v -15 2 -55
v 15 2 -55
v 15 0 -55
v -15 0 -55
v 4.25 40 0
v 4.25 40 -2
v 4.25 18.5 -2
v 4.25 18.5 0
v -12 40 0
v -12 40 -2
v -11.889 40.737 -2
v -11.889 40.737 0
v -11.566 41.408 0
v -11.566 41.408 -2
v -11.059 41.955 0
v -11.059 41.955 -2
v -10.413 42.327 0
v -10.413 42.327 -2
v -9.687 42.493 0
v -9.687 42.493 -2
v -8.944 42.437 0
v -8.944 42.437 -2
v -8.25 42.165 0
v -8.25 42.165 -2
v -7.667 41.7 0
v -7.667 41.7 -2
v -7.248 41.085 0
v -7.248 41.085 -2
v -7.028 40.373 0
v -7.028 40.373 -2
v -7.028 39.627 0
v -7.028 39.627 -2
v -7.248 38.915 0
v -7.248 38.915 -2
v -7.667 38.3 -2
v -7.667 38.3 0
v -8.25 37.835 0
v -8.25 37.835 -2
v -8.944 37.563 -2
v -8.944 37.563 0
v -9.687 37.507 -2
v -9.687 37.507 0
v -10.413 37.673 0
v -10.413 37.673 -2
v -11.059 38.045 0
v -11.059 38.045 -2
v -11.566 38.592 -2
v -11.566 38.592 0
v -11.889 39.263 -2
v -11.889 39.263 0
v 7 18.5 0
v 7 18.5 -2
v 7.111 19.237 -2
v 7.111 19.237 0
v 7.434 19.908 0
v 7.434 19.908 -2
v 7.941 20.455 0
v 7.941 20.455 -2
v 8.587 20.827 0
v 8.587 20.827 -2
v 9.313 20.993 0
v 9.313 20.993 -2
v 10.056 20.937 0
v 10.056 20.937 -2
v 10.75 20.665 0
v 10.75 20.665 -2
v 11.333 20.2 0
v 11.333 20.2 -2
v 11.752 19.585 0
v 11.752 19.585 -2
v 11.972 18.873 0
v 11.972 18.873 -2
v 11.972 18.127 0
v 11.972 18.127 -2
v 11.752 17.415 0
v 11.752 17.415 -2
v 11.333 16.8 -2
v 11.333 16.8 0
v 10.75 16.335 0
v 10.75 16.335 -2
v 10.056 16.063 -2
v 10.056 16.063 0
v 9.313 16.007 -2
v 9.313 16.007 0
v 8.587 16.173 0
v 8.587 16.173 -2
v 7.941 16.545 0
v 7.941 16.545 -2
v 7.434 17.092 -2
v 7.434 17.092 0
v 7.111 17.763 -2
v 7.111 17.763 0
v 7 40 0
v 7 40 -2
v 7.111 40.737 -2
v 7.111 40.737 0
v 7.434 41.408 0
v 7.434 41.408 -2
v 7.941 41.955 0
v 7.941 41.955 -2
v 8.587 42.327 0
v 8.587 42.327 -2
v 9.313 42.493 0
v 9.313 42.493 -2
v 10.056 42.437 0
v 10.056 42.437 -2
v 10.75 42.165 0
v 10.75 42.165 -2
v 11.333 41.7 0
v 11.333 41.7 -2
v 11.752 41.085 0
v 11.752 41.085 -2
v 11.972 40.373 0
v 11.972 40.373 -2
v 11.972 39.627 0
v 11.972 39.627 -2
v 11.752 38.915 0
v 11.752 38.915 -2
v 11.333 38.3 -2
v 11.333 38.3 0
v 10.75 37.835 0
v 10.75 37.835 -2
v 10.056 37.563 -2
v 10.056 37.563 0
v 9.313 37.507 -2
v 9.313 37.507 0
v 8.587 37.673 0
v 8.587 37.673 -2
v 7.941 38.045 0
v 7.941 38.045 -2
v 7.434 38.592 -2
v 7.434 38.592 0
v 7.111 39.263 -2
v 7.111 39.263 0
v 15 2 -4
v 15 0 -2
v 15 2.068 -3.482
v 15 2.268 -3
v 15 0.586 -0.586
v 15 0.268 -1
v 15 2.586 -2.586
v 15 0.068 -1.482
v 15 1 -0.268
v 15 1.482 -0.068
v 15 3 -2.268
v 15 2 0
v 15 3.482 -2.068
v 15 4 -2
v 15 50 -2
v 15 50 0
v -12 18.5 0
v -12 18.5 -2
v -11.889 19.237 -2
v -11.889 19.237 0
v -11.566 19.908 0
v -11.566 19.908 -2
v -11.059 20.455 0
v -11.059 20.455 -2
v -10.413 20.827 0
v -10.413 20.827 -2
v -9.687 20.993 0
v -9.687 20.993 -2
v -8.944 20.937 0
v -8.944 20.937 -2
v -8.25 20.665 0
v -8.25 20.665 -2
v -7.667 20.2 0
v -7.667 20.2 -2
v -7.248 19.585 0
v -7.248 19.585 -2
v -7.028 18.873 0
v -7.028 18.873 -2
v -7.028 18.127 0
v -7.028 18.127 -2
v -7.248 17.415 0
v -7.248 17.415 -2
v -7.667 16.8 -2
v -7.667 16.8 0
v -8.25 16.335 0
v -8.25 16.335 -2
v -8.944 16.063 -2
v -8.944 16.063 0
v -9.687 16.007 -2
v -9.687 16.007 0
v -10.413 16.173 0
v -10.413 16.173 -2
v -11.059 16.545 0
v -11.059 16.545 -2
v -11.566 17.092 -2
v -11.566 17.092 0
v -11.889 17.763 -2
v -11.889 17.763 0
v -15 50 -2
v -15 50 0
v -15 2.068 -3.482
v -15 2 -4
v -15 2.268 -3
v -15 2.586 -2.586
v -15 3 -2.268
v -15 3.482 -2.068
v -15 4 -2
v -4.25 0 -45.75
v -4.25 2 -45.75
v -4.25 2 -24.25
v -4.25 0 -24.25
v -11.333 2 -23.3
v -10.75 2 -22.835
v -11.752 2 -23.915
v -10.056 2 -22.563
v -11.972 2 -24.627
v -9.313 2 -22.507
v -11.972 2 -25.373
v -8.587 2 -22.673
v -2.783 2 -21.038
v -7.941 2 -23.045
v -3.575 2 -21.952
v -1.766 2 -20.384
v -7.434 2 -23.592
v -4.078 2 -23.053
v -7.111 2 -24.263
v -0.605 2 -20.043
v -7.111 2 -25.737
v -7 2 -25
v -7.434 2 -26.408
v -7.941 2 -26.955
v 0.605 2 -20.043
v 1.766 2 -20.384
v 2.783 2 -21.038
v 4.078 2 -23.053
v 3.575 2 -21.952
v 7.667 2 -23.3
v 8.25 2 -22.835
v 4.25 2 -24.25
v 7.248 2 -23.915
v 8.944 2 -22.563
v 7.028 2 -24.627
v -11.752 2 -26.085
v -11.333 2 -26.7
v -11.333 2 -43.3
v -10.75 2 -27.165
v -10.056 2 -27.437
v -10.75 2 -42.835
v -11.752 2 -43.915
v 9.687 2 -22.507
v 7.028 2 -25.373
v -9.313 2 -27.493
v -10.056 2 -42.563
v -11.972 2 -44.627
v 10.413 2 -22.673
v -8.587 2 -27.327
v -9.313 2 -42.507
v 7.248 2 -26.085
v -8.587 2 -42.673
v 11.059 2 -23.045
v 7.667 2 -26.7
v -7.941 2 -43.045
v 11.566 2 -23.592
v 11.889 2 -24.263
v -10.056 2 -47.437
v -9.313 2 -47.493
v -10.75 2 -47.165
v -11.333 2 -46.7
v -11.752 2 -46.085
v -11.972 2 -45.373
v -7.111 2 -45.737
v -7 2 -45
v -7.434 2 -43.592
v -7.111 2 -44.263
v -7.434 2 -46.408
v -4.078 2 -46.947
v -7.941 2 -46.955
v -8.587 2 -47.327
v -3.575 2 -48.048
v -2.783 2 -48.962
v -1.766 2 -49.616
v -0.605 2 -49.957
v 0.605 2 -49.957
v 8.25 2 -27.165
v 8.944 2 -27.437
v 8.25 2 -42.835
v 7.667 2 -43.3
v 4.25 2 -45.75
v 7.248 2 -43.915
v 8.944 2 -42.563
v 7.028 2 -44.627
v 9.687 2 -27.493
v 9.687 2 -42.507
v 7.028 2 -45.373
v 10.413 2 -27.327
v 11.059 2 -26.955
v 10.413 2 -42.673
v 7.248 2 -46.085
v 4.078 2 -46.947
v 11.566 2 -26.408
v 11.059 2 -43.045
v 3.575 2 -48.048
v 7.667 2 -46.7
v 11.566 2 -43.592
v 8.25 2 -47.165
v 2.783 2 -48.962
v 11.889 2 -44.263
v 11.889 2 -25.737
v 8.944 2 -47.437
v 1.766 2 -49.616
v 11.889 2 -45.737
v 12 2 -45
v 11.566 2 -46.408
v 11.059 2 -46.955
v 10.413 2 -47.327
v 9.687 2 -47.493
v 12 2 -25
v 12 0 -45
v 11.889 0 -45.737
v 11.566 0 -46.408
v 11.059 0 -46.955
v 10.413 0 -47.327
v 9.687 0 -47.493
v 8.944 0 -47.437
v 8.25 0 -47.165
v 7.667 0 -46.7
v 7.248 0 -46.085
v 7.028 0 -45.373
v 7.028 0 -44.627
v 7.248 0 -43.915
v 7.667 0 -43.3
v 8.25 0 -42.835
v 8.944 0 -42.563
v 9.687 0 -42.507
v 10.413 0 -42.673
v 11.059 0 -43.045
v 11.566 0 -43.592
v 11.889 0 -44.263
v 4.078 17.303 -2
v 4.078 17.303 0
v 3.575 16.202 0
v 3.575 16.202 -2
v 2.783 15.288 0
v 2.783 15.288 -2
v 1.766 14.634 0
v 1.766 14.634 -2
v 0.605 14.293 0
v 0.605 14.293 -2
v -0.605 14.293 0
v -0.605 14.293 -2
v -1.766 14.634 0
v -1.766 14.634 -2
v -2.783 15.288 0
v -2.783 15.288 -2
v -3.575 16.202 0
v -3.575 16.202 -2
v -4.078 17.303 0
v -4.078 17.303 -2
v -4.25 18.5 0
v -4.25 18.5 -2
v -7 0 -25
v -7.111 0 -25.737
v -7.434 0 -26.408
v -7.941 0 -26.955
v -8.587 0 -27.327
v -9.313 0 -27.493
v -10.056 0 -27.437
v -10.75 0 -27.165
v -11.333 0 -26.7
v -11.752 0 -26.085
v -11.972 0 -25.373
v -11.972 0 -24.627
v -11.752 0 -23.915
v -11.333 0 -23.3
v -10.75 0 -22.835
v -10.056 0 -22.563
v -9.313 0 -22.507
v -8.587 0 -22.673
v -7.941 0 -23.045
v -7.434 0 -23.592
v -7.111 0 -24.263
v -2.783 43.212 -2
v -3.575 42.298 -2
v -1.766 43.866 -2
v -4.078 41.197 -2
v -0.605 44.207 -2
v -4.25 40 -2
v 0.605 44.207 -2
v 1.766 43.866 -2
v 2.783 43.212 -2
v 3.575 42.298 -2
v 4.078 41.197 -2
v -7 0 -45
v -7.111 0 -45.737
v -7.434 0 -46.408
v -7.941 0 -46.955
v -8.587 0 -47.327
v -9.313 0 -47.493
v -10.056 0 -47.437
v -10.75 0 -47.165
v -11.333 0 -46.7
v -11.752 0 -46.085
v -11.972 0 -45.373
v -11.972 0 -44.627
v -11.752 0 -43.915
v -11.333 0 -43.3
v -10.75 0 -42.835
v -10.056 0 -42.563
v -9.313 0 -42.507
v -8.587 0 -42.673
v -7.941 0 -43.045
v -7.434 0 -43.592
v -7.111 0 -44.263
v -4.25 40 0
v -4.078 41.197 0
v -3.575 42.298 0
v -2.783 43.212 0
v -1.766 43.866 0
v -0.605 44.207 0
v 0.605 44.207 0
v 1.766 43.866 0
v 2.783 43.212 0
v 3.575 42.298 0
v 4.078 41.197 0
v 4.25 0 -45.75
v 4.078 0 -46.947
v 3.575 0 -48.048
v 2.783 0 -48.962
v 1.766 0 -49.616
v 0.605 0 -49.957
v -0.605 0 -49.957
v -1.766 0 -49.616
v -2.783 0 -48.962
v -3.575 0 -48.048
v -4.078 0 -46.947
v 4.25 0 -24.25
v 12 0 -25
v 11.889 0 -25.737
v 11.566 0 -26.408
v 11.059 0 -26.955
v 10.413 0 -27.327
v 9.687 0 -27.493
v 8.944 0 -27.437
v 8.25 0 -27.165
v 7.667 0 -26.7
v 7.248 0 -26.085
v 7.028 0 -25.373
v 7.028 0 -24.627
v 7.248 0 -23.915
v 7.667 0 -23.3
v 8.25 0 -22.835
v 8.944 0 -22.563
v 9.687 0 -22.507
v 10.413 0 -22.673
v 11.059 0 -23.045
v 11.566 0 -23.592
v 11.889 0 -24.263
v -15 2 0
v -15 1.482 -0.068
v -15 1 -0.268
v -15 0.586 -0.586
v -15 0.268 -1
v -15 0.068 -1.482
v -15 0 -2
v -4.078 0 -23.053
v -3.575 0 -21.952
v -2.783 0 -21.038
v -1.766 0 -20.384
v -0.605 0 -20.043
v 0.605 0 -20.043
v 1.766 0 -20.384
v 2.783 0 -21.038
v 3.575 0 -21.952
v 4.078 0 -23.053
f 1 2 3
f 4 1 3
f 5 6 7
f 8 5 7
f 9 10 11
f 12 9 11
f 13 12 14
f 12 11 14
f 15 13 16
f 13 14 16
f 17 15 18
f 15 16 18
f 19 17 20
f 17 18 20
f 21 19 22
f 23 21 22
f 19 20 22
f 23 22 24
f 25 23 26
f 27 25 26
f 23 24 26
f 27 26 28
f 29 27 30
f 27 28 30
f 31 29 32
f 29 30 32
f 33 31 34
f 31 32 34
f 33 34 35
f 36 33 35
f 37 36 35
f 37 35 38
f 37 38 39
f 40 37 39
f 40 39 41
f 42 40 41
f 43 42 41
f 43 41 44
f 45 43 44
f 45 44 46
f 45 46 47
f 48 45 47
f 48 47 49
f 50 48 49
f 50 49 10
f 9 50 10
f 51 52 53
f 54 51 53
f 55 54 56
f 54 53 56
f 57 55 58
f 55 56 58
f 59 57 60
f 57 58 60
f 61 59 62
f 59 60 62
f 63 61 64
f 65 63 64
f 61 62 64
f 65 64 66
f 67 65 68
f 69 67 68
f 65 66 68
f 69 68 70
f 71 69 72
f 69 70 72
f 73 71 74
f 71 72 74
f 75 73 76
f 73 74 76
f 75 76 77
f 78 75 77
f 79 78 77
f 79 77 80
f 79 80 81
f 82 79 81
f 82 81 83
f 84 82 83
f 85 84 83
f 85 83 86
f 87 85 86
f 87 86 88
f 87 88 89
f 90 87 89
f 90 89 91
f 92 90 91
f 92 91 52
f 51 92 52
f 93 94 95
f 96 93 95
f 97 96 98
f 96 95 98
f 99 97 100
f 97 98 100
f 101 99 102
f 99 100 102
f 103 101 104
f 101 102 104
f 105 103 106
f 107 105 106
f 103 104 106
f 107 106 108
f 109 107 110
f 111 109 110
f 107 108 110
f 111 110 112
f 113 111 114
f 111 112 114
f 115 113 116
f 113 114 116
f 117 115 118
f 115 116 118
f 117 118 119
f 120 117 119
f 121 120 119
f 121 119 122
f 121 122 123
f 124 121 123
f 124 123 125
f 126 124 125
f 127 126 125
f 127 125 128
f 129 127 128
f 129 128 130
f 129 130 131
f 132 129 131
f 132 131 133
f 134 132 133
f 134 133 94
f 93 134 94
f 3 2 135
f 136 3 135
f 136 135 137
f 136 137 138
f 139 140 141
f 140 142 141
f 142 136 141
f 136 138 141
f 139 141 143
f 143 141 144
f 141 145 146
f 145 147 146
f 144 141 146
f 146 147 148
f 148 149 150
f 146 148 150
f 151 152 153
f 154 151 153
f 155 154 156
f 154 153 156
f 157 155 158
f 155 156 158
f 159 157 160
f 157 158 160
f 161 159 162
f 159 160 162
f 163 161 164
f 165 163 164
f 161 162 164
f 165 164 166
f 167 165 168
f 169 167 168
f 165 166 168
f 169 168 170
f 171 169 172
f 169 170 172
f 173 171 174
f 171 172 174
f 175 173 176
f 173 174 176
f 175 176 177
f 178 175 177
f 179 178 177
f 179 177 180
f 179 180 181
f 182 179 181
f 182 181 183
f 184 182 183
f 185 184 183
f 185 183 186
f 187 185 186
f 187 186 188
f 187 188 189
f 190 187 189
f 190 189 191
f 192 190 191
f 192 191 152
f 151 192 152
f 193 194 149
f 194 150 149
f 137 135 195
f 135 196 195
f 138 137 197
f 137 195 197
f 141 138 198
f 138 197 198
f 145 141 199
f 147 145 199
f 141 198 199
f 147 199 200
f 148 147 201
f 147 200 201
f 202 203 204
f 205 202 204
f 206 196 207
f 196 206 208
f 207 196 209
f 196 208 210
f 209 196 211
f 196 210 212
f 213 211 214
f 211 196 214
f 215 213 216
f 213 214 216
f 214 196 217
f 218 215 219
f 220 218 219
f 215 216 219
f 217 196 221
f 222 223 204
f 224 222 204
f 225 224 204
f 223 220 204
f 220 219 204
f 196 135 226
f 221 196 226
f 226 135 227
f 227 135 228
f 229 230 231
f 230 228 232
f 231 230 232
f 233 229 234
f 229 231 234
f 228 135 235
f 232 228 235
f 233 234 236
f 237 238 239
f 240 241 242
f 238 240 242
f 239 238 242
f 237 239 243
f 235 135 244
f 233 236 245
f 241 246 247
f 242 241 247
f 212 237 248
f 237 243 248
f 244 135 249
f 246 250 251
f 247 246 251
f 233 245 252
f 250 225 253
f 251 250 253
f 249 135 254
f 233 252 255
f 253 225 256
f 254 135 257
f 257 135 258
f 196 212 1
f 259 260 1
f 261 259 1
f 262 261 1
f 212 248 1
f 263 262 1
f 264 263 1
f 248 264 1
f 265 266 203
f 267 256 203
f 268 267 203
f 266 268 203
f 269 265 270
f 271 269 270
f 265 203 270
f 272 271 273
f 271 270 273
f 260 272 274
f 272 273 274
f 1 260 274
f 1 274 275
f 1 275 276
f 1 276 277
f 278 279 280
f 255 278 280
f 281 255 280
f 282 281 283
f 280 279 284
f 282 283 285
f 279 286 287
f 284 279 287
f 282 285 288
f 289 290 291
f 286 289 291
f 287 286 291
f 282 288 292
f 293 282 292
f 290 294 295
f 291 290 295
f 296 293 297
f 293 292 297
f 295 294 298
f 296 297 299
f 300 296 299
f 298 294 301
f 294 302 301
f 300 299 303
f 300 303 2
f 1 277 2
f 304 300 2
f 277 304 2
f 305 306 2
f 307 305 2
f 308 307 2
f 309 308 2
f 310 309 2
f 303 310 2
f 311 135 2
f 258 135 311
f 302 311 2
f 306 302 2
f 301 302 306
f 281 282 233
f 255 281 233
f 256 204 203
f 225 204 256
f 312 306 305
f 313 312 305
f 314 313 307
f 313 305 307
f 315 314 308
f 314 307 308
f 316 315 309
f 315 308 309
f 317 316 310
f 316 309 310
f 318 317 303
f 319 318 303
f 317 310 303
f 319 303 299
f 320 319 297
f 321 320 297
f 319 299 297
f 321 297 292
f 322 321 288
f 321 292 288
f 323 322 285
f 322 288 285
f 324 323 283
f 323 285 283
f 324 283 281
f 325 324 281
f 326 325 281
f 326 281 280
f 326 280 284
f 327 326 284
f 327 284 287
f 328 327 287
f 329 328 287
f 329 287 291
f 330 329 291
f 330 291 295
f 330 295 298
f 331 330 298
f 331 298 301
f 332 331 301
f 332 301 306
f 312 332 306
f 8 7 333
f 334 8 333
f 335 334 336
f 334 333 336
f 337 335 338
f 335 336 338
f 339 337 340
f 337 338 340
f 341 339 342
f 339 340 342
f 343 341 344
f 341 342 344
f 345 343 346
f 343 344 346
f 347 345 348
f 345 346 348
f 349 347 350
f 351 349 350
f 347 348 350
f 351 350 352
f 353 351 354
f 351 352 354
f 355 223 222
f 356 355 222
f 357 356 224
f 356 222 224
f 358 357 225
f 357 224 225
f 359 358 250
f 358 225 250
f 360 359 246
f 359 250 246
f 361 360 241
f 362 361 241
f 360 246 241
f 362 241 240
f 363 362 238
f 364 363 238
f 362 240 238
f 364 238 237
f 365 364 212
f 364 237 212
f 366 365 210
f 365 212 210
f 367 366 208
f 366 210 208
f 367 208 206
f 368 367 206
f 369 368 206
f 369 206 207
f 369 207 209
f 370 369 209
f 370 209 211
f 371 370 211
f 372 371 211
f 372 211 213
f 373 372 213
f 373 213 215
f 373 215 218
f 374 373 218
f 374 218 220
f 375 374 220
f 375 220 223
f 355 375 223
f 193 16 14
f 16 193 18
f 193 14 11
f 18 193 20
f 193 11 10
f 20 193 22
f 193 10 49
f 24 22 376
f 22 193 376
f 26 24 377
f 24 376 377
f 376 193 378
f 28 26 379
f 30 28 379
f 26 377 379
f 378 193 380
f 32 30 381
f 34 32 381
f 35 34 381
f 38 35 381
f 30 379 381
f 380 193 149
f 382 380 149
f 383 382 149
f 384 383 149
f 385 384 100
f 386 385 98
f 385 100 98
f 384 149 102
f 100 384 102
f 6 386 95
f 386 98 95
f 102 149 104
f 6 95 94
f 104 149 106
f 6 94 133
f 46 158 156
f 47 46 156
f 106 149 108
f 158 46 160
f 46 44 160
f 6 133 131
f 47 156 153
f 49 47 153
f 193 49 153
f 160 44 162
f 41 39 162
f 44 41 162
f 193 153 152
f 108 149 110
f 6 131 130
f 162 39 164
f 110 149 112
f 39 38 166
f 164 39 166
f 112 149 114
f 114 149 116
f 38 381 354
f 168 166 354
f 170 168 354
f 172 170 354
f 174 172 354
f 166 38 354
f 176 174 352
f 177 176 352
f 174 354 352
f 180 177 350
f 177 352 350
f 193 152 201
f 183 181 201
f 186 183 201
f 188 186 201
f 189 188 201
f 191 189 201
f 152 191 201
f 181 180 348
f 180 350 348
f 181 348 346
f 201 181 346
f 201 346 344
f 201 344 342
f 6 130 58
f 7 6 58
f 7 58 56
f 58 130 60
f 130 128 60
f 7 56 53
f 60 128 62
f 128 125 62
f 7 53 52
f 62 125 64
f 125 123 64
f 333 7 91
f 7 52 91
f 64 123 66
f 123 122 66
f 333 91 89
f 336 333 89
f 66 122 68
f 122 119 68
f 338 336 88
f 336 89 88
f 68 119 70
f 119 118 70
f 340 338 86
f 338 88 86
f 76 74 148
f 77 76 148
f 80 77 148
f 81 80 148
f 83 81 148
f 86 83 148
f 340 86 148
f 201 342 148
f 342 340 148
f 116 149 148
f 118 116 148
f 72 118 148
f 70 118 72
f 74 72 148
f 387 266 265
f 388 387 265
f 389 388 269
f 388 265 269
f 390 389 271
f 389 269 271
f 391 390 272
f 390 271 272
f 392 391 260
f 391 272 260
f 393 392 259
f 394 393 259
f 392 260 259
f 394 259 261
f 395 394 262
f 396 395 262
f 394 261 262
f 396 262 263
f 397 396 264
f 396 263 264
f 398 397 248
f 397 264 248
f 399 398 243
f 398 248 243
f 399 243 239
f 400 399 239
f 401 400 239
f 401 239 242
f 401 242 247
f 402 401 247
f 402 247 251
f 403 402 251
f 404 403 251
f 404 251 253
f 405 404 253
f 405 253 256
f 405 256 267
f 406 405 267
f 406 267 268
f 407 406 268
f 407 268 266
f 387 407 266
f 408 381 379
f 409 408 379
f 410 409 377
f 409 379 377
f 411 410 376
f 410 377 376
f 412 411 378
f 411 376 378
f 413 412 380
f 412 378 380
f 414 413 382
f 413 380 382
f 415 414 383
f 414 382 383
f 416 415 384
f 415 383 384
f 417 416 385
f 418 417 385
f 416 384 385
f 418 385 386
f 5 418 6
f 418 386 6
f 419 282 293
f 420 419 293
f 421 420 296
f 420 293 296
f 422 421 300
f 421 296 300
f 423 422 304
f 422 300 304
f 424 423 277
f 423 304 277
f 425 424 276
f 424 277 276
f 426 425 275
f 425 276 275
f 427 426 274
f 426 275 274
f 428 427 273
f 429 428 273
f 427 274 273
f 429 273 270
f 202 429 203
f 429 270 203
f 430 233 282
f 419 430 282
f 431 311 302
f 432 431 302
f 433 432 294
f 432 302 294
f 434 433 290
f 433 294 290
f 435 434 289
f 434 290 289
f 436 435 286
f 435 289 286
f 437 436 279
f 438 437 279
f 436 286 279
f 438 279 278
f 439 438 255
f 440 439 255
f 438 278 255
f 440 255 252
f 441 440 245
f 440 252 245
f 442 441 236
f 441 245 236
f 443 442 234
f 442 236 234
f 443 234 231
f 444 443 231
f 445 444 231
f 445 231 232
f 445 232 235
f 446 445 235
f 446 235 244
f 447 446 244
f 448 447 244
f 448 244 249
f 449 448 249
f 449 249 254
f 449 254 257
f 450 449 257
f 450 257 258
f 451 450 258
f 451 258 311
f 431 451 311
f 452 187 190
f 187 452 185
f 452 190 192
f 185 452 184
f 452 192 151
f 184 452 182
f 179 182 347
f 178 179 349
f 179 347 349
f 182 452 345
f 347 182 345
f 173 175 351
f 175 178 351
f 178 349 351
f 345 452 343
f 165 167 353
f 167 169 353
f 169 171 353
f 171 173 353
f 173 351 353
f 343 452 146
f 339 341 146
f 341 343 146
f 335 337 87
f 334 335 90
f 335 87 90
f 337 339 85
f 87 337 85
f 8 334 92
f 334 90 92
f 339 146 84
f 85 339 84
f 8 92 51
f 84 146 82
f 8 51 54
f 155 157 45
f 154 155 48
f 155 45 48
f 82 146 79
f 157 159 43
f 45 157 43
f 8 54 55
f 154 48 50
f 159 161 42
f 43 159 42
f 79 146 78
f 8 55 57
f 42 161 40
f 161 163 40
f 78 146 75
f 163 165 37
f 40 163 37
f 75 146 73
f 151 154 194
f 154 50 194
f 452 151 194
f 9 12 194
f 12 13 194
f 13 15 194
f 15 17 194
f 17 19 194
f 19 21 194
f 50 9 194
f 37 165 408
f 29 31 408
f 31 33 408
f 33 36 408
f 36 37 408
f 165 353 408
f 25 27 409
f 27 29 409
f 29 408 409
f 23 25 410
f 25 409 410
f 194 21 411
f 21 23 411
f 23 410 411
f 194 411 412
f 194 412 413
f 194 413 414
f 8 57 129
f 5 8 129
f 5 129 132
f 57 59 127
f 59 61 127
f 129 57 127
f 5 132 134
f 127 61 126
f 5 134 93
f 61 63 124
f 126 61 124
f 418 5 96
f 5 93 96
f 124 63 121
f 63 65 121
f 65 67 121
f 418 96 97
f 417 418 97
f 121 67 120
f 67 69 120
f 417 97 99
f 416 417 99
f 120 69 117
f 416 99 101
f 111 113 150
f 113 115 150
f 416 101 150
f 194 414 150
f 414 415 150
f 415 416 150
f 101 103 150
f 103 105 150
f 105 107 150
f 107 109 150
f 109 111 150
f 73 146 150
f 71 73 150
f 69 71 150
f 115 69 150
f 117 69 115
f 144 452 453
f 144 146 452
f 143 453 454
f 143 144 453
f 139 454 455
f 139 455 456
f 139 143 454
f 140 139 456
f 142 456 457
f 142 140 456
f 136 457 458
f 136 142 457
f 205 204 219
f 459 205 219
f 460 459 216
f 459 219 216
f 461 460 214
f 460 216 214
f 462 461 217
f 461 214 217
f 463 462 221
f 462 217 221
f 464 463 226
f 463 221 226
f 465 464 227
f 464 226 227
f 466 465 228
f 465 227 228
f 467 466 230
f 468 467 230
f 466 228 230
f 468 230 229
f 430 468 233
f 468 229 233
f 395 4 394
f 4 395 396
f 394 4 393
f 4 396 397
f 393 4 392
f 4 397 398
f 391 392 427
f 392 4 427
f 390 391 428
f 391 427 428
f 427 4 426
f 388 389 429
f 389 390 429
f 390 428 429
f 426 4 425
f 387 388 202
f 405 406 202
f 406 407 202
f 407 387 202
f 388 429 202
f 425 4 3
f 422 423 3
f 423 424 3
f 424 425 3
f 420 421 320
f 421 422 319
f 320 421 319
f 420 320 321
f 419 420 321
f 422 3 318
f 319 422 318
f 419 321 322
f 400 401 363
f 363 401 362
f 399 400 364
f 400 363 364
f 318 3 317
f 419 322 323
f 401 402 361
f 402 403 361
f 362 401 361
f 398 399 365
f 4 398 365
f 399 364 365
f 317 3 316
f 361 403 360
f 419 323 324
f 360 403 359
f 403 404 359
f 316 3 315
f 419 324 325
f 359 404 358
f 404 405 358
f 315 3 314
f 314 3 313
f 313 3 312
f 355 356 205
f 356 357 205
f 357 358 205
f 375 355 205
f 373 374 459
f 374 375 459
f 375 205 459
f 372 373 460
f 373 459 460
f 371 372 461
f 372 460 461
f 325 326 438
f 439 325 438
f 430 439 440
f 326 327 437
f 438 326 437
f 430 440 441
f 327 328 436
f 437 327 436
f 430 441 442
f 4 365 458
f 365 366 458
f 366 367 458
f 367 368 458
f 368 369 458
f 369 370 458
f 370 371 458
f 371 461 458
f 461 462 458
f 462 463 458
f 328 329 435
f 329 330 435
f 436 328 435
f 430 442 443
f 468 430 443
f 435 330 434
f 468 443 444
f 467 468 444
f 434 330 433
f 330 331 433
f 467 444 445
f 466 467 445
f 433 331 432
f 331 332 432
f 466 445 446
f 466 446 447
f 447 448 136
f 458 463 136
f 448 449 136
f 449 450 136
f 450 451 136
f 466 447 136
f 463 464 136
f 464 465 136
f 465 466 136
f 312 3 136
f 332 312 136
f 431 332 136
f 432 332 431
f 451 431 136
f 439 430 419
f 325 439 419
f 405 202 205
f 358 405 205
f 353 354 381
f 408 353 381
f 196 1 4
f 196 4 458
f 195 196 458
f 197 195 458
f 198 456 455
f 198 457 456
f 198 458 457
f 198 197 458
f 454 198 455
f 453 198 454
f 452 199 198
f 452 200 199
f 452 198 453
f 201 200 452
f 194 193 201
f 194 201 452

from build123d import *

# Parameters (mm, degrees)
BOSS_EXTRU_1_DEPTH      = 15
CONG_1_R                = 2
ENL_V_MAT_EXTRU_1_REACH = 4
ESQUISSE2_R             = 2.5
ENL_V_MAT_EXTRU_2_REACH = 4
ESQUISSE3_R             = 2.5


with BuildPart() as part:
    # Esquisse1 → Boss.-Extru.1 (new body, symmetric)
    with BuildSketch(Plane(origin=(0, 0, 0), x_dir=(0, 0, -1), z_dir=(1, 0, 0))):
        Polygon((0, 0), (0, 50), (2, 50), (2, 2), (55, 2), (55, 0), align=None)
    extrude(amount=BOSS_EXTRU_1_DEPTH, both=True)

    # Congé1
    cong_1_edges = [part.edges().sort_by_distance(p)[0] for p in [
        (0, 0, 0),
        (0, 2, -2),
    ]]
    fillet(cong_1_edges, radius=CONG_1_R)

    # Esquisse2 → Enlèv. mat.-Extru.1 (cut, up to next)
    with BuildSketch(Plane(origin=(0, 2, 0), x_dir=(1, 0, 0), z_dir=(0, 1, 0)), mode=Mode.PRIVATE) as enl_v_mat_extru_1_sk1:
        with BuildLine():
            Line((4.25, 24.25), (4.25, 45.75))
            ThreePointArc((4.25, 45.75), (0, 50), (-4.25, 45.75))
            Line((-4.25, 45.75), (-4.25, 24.25))
            ThreePointArc((-4.25, 24.25), (0, 20), (4.25, 24.25))
        make_face()
    enl_v_mat_extru_1_tool1 = extrude(enl_v_mat_extru_1_sk1.sketch, amount=-ENL_V_MAT_EXTRU_1_REACH, mode=Mode.PRIVATE) & part.part
    add(enl_v_mat_extru_1_tool1.solids().sort_by_distance((0, 2, -35))[0], mode=Mode.SUBTRACT)
    # Esquisse2 → Enlèv. mat.-Extru.1 (cut, up to next)
    with BuildSketch(Plane(origin=(0, 2, 0), x_dir=(1, 0, 0), z_dir=(0, 1, 0)), mode=Mode.PRIVATE) as enl_v_mat_extru_1_sk2:
        with Locations((-9.5, 25)):
            Circle(ESQUISSE2_R)
    enl_v_mat_extru_1_tool2 = extrude(enl_v_mat_extru_1_sk2.sketch, amount=-ENL_V_MAT_EXTRU_1_REACH, mode=Mode.PRIVATE) & part.part
    add(enl_v_mat_extru_1_tool2.solids().sort_by_distance((-9.5, 2, -25))[0], mode=Mode.SUBTRACT)
    # Esquisse2 → Enlèv. mat.-Extru.1 (cut, up to next)
    with BuildSketch(Plane(origin=(0, 2, 0), x_dir=(1, 0, 0), z_dir=(0, 1, 0)), mode=Mode.PRIVATE) as enl_v_mat_extru_1_sk3:
        with Locations((-9.5, 45)):
            Circle(ESQUISSE2_R)
    enl_v_mat_extru_1_tool3 = extrude(enl_v_mat_extru_1_sk3.sketch, amount=-ENL_V_MAT_EXTRU_1_REACH, mode=Mode.PRIVATE) & part.part
    add(enl_v_mat_extru_1_tool3.solids().sort_by_distance((-9.5, 2, -45))[0], mode=Mode.SUBTRACT)
    # Esquisse2 → Enlèv. mat.-Extru.1 (cut, up to next)
    with BuildSketch(Plane(origin=(0, 2, 0), x_dir=(1, 0, 0), z_dir=(0, 1, 0)), mode=Mode.PRIVATE) as enl_v_mat_extru_1_sk4:
        with Locations((9.5, 45)):
            Circle(ESQUISSE2_R)
    enl_v_mat_extru_1_tool4 = extrude(enl_v_mat_extru_1_sk4.sketch, amount=-ENL_V_MAT_EXTRU_1_REACH, mode=Mode.PRIVATE) & part.part
    add(enl_v_mat_extru_1_tool4.solids().sort_by_distance((9.5, 2, -45))[0], mode=Mode.SUBTRACT)
    # Esquisse2 → Enlèv. mat.-Extru.1 (cut, up to next)
    with BuildSketch(Plane(origin=(0, 2, 0), x_dir=(1, 0, 0), z_dir=(0, 1, 0)), mode=Mode.PRIVATE) as enl_v_mat_extru_1_sk5:
        with Locations((9.5, 25)):
            Circle(ESQUISSE2_R)
    enl_v_mat_extru_1_tool5 = extrude(enl_v_mat_extru_1_sk5.sketch, amount=-ENL_V_MAT_EXTRU_1_REACH, mode=Mode.PRIVATE) & part.part
    add(enl_v_mat_extru_1_tool5.solids().sort_by_distance((9.5, 2, -25))[0], mode=Mode.SUBTRACT)

    # Esquisse3 → Enlèv. mat.-Extru.2 (cut, up to next)
    with BuildSketch(Plane(origin=(0, 0, -2), x_dir=(-1, 0, 0), z_dir=(0, 0, -1)), mode=Mode.PRIVATE) as enl_v_mat_extru_2_sk1:
        with BuildLine():
            Line((-4.25, 40), (-4.25, 18.5))
            ThreePointArc((-4.25, 18.5), (0, 14.25), (4.25, 18.5))
            Line((4.25, 18.5), (4.25, 40))
            ThreePointArc((4.25, 40), (0, 44.25), (-4.25, 40))
        make_face()
    enl_v_mat_extru_2_tool1 = extrude(enl_v_mat_extru_2_sk1.sketch, amount=-ENL_V_MAT_EXTRU_2_REACH, mode=Mode.PRIVATE) & part.part
    add(enl_v_mat_extru_2_tool1.solids().sort_by_distance((0, 29.25, -2))[0], mode=Mode.SUBTRACT)
    # Esquisse3 → Enlèv. mat.-Extru.2 (cut, up to next)
    with BuildSketch(Plane(origin=(0, 0, -2), x_dir=(-1, 0, 0), z_dir=(0, 0, -1)), mode=Mode.PRIVATE) as enl_v_mat_extru_2_sk2:
        with Locations((-9.5, 40)):
            Circle(ESQUISSE3_R)
    enl_v_mat_extru_2_tool2 = extrude(enl_v_mat_extru_2_sk2.sketch, amount=-ENL_V_MAT_EXTRU_2_REACH, mode=Mode.PRIVATE) & part.part
    add(enl_v_mat_extru_2_tool2.solids().sort_by_distance((9.5, 40, -2))[0], mode=Mode.SUBTRACT)
    # Esquisse3 → Enlèv. mat.-Extru.2 (cut, up to next)
    with BuildSketch(Plane(origin=(0, 0, -2), x_dir=(-1, 0, 0), z_dir=(0, 0, -1)), mode=Mode.PRIVATE) as enl_v_mat_extru_2_sk3:
        with Locations((9.5, 40)):
            Circle(ESQUISSE3_R)
    enl_v_mat_extru_2_tool3 = extrude(enl_v_mat_extru_2_sk3.sketch, amount=-ENL_V_MAT_EXTRU_2_REACH, mode=Mode.PRIVATE) & part.part
    add(enl_v_mat_extru_2_tool3.solids().sort_by_distance((-9.5, 40, -2))[0], mode=Mode.SUBTRACT)
    # Esquisse3 → Enlèv. mat.-Extru.2 (cut, up to next)
    with BuildSketch(Plane(origin=(0, 0, -2), x_dir=(-1, 0, 0), z_dir=(0, 0, -1)), mode=Mode.PRIVATE) as enl_v_mat_extru_2_sk4:
        with Locations((9.5, 18.5)):
            Circle(ESQUISSE3_R)
    enl_v_mat_extru_2_tool4 = extrude(enl_v_mat_extru_2_sk4.sketch, amount=-ENL_V_MAT_EXTRU_2_REACH, mode=Mode.PRIVATE) & part.part
    add(enl_v_mat_extru_2_tool4.solids().sort_by_distance((-9.5, 18.5, -2))[0], mode=Mode.SUBTRACT)
    # Esquisse3 → Enlèv. mat.-Extru.2 (cut, up to next)
    with BuildSketch(Plane(origin=(0, 0, -2), x_dir=(-1, 0, 0), z_dir=(0, 0, -1)), mode=Mode.PRIVATE) as enl_v_mat_extru_2_sk5:
        with Locations((-9.5, 18.5)):
            Circle(ESQUISSE3_R)
    enl_v_mat_extru_2_tool5 = extrude(enl_v_mat_extru_2_sk5.sketch, amount=-ENL_V_MAT_EXTRU_2_REACH, mode=Mode.PRIVATE) & part.part
    add(enl_v_mat_extru_2_tool5.solids().sort_by_distance((9.5, 18.5, -2))[0], mode=Mode.SUBTRACT)


solid = part.part
